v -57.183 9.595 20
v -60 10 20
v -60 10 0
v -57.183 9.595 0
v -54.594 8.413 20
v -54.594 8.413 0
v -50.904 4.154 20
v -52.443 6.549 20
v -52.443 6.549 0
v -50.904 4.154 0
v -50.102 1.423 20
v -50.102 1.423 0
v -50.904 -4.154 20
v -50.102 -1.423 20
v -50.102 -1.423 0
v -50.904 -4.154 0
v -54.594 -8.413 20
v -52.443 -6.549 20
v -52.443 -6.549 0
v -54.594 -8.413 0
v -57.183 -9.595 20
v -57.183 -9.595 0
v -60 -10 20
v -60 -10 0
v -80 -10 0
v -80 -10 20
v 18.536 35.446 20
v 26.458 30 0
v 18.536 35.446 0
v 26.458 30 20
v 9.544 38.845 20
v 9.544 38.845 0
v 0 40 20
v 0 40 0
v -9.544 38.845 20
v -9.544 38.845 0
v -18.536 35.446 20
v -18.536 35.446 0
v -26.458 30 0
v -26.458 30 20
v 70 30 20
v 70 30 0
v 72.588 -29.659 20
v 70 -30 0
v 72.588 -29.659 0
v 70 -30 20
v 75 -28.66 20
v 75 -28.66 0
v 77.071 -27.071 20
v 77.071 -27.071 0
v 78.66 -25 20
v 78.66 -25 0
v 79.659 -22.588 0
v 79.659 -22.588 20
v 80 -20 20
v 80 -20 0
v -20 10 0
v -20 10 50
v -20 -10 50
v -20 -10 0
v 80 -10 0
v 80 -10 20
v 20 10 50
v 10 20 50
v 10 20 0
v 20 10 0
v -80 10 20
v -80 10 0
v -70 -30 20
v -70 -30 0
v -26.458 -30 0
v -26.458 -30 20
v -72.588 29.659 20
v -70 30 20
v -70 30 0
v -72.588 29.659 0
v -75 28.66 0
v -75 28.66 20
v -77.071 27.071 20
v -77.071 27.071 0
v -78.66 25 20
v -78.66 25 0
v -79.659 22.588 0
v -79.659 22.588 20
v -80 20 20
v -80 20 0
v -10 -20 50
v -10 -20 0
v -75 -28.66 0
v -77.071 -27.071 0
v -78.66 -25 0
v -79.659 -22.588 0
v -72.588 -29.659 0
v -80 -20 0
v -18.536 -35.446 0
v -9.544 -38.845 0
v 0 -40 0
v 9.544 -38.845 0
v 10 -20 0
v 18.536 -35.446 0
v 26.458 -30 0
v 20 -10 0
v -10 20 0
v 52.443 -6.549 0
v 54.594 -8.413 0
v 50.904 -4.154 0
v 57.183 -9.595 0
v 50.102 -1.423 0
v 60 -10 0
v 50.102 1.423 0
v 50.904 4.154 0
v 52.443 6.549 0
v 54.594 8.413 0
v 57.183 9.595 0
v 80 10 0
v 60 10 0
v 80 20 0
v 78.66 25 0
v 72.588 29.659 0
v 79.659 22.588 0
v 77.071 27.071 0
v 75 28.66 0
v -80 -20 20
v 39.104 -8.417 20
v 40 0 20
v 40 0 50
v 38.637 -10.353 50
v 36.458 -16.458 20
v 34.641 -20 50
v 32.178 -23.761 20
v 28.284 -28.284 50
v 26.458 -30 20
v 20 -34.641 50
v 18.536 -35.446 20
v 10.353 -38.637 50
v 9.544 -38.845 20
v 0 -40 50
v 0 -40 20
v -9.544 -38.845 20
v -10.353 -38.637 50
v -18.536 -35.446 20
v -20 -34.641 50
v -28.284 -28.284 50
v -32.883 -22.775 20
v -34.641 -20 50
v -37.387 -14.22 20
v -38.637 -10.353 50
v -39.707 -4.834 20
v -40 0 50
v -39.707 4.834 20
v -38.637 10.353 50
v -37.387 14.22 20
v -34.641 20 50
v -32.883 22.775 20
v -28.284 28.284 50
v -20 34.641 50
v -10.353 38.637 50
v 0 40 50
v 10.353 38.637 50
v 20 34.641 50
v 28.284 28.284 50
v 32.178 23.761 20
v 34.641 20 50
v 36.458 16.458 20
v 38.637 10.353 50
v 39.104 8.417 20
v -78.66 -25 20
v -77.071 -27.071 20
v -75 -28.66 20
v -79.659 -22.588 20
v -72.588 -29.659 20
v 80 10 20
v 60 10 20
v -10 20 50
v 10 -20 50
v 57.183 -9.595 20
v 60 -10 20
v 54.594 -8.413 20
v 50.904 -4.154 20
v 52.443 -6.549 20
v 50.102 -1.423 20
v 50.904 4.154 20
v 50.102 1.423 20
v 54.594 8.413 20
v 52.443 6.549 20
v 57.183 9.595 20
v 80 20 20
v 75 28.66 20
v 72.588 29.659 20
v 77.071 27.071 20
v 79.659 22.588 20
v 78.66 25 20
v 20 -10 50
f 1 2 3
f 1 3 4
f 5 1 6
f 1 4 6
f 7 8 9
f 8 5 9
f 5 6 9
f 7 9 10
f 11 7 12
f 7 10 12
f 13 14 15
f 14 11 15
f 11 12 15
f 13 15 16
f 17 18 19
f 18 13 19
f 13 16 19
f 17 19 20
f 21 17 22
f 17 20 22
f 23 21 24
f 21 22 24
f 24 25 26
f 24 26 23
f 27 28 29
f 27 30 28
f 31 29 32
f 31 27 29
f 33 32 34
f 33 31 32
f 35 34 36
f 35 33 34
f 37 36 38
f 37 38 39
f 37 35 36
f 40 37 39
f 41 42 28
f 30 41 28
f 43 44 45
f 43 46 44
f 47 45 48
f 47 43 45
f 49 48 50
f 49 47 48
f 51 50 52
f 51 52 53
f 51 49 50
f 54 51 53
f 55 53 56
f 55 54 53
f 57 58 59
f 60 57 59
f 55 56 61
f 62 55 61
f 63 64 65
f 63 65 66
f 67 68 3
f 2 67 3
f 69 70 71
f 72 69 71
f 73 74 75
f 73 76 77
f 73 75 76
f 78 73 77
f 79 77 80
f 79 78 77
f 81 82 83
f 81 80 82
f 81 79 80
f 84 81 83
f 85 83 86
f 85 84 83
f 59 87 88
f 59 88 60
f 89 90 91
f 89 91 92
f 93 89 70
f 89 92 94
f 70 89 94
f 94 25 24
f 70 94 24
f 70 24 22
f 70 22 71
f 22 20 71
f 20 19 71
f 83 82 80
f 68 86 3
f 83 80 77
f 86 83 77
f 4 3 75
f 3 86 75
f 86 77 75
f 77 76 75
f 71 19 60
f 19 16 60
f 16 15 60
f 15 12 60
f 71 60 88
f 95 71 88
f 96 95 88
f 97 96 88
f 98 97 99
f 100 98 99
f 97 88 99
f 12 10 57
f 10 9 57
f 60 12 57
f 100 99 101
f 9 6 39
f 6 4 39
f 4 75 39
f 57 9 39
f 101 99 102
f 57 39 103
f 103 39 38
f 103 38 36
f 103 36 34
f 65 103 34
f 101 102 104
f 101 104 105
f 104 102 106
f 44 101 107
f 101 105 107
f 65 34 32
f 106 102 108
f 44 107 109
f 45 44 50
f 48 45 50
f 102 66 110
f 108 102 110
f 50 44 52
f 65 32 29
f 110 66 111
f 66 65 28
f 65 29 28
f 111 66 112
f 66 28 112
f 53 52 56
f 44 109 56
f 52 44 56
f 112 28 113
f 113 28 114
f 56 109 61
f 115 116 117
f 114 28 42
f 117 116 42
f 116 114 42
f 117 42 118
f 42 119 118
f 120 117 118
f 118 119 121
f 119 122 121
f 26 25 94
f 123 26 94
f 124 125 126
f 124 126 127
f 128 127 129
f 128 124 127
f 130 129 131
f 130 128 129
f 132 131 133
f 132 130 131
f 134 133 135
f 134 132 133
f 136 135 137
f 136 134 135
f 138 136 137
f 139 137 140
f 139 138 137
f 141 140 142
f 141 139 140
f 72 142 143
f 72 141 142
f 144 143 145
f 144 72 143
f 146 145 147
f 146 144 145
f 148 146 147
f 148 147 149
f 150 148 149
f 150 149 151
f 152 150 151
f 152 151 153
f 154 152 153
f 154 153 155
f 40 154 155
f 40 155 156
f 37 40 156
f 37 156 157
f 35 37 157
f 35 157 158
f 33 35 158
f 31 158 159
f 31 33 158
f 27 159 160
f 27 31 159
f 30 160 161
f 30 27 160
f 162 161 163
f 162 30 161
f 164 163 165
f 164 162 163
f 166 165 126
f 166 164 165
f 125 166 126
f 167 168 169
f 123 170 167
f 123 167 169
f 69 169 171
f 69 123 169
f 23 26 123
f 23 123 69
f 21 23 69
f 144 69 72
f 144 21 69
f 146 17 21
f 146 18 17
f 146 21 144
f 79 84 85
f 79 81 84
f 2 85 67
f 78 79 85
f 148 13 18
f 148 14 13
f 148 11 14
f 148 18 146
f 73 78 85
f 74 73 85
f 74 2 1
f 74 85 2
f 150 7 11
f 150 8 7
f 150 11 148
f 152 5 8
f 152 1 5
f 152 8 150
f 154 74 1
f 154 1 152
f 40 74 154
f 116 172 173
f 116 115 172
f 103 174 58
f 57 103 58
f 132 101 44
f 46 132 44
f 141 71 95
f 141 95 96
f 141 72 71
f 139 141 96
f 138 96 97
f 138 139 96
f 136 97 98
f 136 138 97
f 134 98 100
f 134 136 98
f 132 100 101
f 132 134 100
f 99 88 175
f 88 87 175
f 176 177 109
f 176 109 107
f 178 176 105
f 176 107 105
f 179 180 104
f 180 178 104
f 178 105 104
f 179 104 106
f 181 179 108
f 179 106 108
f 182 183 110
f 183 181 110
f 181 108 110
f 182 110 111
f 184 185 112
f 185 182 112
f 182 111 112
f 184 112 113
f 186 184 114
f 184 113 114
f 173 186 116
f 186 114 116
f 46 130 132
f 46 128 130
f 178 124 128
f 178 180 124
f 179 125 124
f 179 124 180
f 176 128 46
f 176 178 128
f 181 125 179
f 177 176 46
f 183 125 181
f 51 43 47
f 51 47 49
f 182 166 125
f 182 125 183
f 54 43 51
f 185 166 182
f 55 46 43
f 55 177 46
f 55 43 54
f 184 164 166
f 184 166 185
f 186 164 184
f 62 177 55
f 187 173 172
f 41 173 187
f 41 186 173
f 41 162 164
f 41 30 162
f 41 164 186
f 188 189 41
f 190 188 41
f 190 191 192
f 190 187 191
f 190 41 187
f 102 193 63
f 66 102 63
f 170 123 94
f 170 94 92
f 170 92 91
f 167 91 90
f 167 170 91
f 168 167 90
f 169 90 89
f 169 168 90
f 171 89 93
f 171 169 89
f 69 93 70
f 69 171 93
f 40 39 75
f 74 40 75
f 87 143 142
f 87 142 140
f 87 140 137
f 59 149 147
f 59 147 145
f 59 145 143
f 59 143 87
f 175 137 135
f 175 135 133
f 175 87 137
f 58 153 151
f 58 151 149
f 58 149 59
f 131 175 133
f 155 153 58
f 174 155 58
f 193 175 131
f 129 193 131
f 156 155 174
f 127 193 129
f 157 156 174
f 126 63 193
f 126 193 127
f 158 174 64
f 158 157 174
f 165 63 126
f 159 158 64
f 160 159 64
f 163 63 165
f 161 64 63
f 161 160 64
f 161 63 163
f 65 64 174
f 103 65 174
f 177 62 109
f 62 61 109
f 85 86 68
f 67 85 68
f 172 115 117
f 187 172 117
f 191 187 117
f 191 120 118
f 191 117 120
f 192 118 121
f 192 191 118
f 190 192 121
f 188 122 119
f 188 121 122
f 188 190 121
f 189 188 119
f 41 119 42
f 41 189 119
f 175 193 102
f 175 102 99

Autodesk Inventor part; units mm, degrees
ref_plane "YZ Plane" through (0, 0, 0) normal (1, 0, 0) x (0, 1, 0)
ref_plane "XZ Plane" through (0, 0, 0) normal (0, 1, 0) x (-1, 0, 0)
ref_plane "XY Plane" through (0, 0, 0) normal (0, 0, 1) x (1, 0, 0)
sketch "Boceto1" plane through (0, 0, 0) normal (0, 0, 1) x (1, 0, 0)
  line L0 (-80, -30) -> (80, -30)
  line L1 (80, 30) -> (-80, 30)
  line L2 (-80, -30) -> (80, 30) construction
  line L3 (80, -30) -> (-80, 30) construction
  line L4 (0, -42) -> (0, 42) construction
  line L5 (-112, 0) -> (112, 0) construction
  arc A0 (-60, -10) -> (-60, 10) centre (-60, 0) ccw
  line L6 (-80, 10) -> (-60, 10)
  line L7 (-80, -10) -> (-60, -10)
  arc A1 (60, 10) -> (60, -10) centre (60, 0) ccw
  line L8 (80, 10) -> (60, 10)
  line L9 (80, -10) -> (60, -10)
  line L10 (-80, 30) -> (-80, 10)
  line L11 (-80, -10) -> (-80, -30)
  line L12 (80, -30) -> (80, -10)
  line L13 (80, 10) -> (80, 30)
  point P0 (0, 0)
  dimension "d2" = 160
  dimension "d3" = 60
  dimension "d4" = 20
  dimension "d6" = 20
  dimension "d7" = 20
extrude "Extrusión1" add sketch "Boceto1" along normal blind 20
sketch "Boceto2" plane through (0, 0, 20) normal (0, 0, 1) x (1, 0, 0)
  circle A0 centre (0, 0) radius 40
  dimension "d10" = 80
extrude "Extrusión2" add sketch "Boceto2" along normal blind 30 and the other way blind 20
sketch "Boceto3" plane through (0, 0, 50) normal (0, 0, 1) x (1, 0, 0)
  line L0 (-10, -20) -> (10, -20)
  line L1 (20, -10) -> (20, 10)
  line L2 (10, 20) -> (-10, 20)
  line L3 (-20, 10) -> (-20, -10)
  line L4 (-20, -20) -> (20, 20) construction
  line L5 (20, -20) -> (-20, 20) construction
  line L6 (-10, 20) -> (-20, 10)
  line L7 (10, 20) -> (20, 10)
  line L8 (20, -10) -> (10, -20)
  line L9 (-10, -20) -> (-20, -10)
  point P0 (0, 0)
  dimension "d15" = 40
  dimension "d16" = 40
  dimension "d17" = 10
  dimension "d18" = 10
  dimension "d19" = 10
  dimension "d20" = 10
  dimension "d21" = 10
  dimension "d22" = 10
  dimension "d23" = 10
  dimension "d24" = 10
extrude "Extrusión3" cut sketch "Boceto3" against normal through all
fillet "Empalme1" radius 10 4 edges at (80, 30, 10) (-80, 30, 10) (80, -30, 10) (-80, -30, 10)
equation "\"d18\" = d17"
equation "\"d19\" = d17"
equation "\"d20\" = d19"
equation "\"d21\" = d17"
equation "\"d22\" = d21"
equation "\"d23\" = d17"
equation "\"d24\" = d23"
properties part number "Lab2A01209499P10"
